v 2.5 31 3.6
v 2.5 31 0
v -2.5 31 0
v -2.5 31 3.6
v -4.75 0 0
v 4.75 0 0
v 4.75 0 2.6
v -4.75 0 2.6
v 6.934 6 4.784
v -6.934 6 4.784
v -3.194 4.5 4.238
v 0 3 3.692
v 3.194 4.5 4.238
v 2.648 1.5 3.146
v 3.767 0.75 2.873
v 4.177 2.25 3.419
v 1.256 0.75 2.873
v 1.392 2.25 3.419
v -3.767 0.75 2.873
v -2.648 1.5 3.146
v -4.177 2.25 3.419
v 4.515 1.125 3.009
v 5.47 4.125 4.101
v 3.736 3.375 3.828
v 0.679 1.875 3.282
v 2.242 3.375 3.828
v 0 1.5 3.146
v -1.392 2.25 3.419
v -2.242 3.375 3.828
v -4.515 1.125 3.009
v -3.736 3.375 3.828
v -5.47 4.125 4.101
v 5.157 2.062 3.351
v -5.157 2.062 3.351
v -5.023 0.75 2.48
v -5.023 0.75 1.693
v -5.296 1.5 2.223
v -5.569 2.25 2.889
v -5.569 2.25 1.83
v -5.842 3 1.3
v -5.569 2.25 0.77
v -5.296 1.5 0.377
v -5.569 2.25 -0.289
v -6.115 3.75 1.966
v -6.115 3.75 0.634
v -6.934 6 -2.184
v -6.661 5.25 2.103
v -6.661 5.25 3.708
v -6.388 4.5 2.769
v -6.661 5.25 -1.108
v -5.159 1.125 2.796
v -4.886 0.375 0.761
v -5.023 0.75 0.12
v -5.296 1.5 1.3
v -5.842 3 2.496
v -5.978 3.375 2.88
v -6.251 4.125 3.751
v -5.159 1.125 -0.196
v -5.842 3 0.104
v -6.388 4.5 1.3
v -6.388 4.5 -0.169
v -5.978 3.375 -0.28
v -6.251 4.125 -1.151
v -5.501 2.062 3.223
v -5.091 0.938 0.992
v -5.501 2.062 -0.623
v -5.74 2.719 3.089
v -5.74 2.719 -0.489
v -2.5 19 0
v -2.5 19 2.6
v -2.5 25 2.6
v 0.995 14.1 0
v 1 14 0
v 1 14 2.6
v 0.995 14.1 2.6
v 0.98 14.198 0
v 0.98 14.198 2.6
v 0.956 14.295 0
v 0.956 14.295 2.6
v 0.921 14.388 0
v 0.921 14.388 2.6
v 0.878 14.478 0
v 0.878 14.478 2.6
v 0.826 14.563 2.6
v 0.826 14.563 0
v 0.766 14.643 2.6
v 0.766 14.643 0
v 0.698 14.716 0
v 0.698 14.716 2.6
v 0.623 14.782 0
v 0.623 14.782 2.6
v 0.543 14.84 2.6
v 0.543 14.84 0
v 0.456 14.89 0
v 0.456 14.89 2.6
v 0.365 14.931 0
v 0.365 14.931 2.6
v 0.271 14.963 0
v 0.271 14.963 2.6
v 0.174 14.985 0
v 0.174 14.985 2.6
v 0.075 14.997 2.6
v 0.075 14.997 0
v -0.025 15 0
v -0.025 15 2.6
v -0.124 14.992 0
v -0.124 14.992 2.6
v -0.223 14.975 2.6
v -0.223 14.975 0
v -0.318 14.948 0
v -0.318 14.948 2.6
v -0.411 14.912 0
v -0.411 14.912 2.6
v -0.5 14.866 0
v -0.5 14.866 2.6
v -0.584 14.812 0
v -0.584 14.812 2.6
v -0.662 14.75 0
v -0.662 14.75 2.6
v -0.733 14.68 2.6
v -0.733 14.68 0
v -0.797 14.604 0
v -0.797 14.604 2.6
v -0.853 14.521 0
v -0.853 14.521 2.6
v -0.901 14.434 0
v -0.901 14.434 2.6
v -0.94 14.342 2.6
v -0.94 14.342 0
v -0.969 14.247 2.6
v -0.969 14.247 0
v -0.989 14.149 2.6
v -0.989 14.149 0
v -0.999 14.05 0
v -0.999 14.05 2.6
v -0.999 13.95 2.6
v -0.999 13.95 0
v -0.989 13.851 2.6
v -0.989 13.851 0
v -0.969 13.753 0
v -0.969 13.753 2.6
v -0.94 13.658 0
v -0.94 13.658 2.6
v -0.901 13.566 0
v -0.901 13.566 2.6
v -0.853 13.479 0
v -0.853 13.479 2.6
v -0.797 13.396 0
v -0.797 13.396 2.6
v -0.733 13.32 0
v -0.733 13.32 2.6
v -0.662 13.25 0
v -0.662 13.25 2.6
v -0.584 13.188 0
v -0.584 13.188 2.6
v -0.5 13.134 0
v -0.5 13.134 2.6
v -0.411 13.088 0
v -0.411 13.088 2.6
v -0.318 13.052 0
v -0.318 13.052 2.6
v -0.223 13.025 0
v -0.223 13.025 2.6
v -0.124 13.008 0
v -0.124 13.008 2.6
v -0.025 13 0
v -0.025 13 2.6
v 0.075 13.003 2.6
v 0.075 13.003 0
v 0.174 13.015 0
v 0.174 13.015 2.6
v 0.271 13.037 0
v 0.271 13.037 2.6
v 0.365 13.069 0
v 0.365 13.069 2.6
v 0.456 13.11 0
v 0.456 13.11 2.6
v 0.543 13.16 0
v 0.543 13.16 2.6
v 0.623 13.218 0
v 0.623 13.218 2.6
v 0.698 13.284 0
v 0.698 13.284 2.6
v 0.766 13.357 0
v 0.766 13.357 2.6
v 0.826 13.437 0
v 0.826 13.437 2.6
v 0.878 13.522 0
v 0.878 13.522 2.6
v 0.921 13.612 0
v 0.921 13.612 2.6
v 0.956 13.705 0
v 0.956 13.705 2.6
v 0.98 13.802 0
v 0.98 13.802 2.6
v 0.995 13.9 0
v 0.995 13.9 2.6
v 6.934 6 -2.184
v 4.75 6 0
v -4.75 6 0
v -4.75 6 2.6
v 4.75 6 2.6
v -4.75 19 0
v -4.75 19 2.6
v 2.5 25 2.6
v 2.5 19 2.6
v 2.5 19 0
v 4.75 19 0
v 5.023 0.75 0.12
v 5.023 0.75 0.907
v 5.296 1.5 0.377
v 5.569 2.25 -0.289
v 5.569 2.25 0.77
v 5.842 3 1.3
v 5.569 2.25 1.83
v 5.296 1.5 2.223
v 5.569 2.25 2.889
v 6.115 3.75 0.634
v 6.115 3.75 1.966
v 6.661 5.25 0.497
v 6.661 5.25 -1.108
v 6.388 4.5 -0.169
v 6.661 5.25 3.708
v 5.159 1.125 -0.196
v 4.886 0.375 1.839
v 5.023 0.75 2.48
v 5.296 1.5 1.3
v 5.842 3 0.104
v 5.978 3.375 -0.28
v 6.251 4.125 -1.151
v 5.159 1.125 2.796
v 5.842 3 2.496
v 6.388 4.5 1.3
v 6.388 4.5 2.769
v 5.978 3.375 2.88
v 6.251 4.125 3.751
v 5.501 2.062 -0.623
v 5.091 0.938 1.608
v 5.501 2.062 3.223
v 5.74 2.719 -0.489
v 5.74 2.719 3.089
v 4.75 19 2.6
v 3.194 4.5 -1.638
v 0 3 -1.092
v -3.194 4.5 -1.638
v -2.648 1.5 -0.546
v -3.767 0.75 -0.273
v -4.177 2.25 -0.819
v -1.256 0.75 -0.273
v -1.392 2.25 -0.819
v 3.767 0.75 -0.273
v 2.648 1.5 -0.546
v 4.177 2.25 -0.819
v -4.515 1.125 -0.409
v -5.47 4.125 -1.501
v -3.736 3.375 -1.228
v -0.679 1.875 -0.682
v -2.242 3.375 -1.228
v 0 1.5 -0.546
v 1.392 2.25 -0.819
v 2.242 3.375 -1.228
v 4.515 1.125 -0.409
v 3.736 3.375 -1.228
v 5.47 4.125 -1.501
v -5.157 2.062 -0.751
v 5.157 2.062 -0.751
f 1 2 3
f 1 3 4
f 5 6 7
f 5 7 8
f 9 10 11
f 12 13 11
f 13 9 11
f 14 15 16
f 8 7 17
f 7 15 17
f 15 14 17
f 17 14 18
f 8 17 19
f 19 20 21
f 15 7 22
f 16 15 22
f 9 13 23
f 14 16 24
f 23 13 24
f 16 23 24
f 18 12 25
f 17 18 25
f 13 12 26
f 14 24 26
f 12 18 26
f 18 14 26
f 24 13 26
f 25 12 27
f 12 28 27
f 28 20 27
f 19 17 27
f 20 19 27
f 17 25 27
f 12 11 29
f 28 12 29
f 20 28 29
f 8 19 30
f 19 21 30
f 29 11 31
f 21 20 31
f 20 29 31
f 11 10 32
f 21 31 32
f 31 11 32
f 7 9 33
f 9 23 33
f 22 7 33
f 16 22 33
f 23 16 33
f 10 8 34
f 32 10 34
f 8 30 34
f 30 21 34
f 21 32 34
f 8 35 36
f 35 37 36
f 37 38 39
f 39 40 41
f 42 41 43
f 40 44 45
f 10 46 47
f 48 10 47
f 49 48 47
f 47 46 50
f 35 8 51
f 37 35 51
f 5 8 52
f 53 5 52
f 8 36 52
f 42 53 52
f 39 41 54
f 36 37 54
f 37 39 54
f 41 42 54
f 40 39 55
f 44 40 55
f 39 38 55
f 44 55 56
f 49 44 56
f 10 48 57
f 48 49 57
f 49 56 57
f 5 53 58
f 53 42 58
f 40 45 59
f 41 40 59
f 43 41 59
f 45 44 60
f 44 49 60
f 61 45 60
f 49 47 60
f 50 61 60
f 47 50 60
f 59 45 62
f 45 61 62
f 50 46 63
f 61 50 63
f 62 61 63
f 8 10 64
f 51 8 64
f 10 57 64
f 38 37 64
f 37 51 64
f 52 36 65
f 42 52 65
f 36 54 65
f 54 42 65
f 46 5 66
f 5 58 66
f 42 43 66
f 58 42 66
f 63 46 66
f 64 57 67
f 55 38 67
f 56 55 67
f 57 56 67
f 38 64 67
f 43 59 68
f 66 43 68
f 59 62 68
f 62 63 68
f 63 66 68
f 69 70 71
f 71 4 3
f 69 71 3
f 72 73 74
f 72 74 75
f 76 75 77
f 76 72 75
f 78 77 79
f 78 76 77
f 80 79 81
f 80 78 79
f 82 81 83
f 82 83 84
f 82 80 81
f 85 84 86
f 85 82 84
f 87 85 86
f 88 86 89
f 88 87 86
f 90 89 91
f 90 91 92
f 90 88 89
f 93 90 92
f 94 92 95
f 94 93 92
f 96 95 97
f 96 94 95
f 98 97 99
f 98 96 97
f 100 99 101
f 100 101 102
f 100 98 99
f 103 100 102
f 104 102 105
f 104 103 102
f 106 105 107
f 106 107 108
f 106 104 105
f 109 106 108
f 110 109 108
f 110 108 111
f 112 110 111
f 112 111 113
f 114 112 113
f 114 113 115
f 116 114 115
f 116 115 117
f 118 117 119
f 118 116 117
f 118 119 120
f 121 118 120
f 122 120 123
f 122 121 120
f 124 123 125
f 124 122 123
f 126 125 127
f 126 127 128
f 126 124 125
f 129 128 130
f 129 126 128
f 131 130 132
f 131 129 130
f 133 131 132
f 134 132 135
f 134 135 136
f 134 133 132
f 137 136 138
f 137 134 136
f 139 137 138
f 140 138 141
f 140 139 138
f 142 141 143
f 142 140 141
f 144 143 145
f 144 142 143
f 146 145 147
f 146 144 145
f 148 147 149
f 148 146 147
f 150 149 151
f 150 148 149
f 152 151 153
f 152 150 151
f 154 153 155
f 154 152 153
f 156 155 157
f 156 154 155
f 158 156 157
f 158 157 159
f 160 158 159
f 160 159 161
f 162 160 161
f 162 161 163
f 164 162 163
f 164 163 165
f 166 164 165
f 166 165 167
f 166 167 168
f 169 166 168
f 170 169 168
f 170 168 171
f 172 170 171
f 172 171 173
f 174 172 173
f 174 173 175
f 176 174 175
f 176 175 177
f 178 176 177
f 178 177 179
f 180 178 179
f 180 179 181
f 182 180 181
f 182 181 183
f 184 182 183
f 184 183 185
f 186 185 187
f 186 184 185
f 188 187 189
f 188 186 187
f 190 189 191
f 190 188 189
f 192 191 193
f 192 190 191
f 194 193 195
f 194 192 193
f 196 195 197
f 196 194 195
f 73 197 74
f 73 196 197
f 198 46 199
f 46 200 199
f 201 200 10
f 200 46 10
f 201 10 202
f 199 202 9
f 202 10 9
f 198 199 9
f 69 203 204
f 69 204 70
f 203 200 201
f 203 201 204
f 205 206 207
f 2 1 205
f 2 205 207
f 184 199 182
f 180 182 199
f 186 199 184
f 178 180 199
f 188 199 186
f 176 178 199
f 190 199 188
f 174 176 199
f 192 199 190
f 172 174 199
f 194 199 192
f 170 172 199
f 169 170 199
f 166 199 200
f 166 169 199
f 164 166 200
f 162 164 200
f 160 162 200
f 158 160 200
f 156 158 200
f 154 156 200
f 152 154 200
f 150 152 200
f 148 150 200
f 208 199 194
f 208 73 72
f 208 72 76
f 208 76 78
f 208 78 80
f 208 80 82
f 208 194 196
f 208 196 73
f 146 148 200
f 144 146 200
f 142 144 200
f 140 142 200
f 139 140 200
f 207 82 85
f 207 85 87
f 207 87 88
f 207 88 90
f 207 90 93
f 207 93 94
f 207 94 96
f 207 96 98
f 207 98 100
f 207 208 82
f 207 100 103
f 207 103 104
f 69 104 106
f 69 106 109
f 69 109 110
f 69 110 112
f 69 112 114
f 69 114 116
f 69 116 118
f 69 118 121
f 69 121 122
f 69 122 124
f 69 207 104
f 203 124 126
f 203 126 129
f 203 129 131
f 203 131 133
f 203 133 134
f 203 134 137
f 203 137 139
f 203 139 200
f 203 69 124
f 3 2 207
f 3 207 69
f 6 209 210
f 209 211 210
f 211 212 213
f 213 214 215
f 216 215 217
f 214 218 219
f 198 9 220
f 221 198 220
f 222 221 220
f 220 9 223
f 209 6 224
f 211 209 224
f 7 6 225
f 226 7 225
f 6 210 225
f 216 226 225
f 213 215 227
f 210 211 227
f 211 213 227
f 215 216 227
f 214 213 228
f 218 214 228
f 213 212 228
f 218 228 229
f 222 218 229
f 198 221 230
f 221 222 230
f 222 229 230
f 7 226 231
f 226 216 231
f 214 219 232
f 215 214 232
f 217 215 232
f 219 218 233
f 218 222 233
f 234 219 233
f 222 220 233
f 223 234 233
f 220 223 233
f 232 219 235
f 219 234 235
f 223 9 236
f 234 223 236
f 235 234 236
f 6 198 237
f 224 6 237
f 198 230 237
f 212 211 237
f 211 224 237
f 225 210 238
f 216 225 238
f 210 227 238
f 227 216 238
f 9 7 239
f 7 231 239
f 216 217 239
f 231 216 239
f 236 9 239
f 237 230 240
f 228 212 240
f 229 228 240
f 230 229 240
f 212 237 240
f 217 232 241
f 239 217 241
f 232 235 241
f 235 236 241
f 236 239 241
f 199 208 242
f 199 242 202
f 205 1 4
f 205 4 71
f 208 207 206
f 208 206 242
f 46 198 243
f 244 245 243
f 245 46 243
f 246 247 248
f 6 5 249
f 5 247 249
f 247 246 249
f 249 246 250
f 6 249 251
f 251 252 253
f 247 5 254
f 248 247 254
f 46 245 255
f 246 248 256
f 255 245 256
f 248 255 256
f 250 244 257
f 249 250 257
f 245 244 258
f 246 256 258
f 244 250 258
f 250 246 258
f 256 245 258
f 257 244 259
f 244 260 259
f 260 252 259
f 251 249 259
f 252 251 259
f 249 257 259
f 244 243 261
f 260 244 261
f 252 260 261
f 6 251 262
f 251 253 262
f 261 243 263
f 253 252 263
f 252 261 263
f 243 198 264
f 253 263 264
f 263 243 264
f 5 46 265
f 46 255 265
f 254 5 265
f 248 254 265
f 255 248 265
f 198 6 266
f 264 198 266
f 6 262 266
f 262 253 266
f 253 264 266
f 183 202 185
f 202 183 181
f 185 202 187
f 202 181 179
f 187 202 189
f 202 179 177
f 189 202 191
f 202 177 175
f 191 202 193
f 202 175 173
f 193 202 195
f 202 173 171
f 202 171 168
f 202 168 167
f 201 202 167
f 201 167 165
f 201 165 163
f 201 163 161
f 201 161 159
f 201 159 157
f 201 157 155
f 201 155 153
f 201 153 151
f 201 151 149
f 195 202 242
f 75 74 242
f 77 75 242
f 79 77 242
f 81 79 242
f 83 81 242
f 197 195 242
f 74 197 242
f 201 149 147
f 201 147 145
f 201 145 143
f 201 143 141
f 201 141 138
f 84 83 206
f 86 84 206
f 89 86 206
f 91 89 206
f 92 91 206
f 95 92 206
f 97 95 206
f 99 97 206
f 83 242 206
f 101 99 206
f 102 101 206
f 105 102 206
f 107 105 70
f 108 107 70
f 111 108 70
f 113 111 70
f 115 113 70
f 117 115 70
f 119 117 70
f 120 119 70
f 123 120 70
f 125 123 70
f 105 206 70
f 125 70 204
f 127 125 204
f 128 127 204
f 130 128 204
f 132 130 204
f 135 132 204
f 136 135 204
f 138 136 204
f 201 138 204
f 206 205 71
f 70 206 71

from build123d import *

# Parameters (mm, degrees)
ESBO_O1_R                = 1
RESSALTO_EXTRUS_O1_DEPTH = 2.6
ESBO_O2_W                = 9.5
ESBO_O2_H                = 2.6
RESSALTO_EXTRUS_O2_DEPTH = 6
RESSALTO_EXTRUS_O2_TAPER = -20
RESSALTO_EXTRUS_O3_DEPTH = 5


with BuildPart() as part:
    # Esboço1 → Ressalto-extrusão1 (new body)
    with BuildSketch(Plane.XY):
        Polygon((-2.5, 31), (2.5, 31), (2.5, 19), (4.75, 19), (4.75, 0), (-4.75, 0), (-4.75, 19), (-2.5, 19), align=None)
        with Locations((0, 14)):
            Circle(ESBO_O1_R, mode=Mode.SUBTRACT)
    extrude(amount=RESSALTO_EXTRUS_O1_DEPTH)

    # Esboço2 → Ressalto-extrusão2 (add)
    with BuildSketch(Plane.XZ):
        with Locations((0, 1.3)):
            Rectangle(ESBO_O2_W, ESBO_O2_H)
    extrude(amount=-RESSALTO_EXTRUS_O2_DEPTH, taper=RESSALTO_EXTRUS_O2_TAPER)

    # Esboço3 → Ressalto-extrusão3 (add)
    with BuildSketch(Plane(origin=(2.5, 0, 0), x_dir=(0, 0, -1), z_dir=(1, 0, 0))):
        Polygon((-2.6, 31), (-3.6, 31), (-2.6, 25), align=None)
    extrude(amount=-RESSALTO_EXTRUS_O3_DEPTH)


solid = part.part
